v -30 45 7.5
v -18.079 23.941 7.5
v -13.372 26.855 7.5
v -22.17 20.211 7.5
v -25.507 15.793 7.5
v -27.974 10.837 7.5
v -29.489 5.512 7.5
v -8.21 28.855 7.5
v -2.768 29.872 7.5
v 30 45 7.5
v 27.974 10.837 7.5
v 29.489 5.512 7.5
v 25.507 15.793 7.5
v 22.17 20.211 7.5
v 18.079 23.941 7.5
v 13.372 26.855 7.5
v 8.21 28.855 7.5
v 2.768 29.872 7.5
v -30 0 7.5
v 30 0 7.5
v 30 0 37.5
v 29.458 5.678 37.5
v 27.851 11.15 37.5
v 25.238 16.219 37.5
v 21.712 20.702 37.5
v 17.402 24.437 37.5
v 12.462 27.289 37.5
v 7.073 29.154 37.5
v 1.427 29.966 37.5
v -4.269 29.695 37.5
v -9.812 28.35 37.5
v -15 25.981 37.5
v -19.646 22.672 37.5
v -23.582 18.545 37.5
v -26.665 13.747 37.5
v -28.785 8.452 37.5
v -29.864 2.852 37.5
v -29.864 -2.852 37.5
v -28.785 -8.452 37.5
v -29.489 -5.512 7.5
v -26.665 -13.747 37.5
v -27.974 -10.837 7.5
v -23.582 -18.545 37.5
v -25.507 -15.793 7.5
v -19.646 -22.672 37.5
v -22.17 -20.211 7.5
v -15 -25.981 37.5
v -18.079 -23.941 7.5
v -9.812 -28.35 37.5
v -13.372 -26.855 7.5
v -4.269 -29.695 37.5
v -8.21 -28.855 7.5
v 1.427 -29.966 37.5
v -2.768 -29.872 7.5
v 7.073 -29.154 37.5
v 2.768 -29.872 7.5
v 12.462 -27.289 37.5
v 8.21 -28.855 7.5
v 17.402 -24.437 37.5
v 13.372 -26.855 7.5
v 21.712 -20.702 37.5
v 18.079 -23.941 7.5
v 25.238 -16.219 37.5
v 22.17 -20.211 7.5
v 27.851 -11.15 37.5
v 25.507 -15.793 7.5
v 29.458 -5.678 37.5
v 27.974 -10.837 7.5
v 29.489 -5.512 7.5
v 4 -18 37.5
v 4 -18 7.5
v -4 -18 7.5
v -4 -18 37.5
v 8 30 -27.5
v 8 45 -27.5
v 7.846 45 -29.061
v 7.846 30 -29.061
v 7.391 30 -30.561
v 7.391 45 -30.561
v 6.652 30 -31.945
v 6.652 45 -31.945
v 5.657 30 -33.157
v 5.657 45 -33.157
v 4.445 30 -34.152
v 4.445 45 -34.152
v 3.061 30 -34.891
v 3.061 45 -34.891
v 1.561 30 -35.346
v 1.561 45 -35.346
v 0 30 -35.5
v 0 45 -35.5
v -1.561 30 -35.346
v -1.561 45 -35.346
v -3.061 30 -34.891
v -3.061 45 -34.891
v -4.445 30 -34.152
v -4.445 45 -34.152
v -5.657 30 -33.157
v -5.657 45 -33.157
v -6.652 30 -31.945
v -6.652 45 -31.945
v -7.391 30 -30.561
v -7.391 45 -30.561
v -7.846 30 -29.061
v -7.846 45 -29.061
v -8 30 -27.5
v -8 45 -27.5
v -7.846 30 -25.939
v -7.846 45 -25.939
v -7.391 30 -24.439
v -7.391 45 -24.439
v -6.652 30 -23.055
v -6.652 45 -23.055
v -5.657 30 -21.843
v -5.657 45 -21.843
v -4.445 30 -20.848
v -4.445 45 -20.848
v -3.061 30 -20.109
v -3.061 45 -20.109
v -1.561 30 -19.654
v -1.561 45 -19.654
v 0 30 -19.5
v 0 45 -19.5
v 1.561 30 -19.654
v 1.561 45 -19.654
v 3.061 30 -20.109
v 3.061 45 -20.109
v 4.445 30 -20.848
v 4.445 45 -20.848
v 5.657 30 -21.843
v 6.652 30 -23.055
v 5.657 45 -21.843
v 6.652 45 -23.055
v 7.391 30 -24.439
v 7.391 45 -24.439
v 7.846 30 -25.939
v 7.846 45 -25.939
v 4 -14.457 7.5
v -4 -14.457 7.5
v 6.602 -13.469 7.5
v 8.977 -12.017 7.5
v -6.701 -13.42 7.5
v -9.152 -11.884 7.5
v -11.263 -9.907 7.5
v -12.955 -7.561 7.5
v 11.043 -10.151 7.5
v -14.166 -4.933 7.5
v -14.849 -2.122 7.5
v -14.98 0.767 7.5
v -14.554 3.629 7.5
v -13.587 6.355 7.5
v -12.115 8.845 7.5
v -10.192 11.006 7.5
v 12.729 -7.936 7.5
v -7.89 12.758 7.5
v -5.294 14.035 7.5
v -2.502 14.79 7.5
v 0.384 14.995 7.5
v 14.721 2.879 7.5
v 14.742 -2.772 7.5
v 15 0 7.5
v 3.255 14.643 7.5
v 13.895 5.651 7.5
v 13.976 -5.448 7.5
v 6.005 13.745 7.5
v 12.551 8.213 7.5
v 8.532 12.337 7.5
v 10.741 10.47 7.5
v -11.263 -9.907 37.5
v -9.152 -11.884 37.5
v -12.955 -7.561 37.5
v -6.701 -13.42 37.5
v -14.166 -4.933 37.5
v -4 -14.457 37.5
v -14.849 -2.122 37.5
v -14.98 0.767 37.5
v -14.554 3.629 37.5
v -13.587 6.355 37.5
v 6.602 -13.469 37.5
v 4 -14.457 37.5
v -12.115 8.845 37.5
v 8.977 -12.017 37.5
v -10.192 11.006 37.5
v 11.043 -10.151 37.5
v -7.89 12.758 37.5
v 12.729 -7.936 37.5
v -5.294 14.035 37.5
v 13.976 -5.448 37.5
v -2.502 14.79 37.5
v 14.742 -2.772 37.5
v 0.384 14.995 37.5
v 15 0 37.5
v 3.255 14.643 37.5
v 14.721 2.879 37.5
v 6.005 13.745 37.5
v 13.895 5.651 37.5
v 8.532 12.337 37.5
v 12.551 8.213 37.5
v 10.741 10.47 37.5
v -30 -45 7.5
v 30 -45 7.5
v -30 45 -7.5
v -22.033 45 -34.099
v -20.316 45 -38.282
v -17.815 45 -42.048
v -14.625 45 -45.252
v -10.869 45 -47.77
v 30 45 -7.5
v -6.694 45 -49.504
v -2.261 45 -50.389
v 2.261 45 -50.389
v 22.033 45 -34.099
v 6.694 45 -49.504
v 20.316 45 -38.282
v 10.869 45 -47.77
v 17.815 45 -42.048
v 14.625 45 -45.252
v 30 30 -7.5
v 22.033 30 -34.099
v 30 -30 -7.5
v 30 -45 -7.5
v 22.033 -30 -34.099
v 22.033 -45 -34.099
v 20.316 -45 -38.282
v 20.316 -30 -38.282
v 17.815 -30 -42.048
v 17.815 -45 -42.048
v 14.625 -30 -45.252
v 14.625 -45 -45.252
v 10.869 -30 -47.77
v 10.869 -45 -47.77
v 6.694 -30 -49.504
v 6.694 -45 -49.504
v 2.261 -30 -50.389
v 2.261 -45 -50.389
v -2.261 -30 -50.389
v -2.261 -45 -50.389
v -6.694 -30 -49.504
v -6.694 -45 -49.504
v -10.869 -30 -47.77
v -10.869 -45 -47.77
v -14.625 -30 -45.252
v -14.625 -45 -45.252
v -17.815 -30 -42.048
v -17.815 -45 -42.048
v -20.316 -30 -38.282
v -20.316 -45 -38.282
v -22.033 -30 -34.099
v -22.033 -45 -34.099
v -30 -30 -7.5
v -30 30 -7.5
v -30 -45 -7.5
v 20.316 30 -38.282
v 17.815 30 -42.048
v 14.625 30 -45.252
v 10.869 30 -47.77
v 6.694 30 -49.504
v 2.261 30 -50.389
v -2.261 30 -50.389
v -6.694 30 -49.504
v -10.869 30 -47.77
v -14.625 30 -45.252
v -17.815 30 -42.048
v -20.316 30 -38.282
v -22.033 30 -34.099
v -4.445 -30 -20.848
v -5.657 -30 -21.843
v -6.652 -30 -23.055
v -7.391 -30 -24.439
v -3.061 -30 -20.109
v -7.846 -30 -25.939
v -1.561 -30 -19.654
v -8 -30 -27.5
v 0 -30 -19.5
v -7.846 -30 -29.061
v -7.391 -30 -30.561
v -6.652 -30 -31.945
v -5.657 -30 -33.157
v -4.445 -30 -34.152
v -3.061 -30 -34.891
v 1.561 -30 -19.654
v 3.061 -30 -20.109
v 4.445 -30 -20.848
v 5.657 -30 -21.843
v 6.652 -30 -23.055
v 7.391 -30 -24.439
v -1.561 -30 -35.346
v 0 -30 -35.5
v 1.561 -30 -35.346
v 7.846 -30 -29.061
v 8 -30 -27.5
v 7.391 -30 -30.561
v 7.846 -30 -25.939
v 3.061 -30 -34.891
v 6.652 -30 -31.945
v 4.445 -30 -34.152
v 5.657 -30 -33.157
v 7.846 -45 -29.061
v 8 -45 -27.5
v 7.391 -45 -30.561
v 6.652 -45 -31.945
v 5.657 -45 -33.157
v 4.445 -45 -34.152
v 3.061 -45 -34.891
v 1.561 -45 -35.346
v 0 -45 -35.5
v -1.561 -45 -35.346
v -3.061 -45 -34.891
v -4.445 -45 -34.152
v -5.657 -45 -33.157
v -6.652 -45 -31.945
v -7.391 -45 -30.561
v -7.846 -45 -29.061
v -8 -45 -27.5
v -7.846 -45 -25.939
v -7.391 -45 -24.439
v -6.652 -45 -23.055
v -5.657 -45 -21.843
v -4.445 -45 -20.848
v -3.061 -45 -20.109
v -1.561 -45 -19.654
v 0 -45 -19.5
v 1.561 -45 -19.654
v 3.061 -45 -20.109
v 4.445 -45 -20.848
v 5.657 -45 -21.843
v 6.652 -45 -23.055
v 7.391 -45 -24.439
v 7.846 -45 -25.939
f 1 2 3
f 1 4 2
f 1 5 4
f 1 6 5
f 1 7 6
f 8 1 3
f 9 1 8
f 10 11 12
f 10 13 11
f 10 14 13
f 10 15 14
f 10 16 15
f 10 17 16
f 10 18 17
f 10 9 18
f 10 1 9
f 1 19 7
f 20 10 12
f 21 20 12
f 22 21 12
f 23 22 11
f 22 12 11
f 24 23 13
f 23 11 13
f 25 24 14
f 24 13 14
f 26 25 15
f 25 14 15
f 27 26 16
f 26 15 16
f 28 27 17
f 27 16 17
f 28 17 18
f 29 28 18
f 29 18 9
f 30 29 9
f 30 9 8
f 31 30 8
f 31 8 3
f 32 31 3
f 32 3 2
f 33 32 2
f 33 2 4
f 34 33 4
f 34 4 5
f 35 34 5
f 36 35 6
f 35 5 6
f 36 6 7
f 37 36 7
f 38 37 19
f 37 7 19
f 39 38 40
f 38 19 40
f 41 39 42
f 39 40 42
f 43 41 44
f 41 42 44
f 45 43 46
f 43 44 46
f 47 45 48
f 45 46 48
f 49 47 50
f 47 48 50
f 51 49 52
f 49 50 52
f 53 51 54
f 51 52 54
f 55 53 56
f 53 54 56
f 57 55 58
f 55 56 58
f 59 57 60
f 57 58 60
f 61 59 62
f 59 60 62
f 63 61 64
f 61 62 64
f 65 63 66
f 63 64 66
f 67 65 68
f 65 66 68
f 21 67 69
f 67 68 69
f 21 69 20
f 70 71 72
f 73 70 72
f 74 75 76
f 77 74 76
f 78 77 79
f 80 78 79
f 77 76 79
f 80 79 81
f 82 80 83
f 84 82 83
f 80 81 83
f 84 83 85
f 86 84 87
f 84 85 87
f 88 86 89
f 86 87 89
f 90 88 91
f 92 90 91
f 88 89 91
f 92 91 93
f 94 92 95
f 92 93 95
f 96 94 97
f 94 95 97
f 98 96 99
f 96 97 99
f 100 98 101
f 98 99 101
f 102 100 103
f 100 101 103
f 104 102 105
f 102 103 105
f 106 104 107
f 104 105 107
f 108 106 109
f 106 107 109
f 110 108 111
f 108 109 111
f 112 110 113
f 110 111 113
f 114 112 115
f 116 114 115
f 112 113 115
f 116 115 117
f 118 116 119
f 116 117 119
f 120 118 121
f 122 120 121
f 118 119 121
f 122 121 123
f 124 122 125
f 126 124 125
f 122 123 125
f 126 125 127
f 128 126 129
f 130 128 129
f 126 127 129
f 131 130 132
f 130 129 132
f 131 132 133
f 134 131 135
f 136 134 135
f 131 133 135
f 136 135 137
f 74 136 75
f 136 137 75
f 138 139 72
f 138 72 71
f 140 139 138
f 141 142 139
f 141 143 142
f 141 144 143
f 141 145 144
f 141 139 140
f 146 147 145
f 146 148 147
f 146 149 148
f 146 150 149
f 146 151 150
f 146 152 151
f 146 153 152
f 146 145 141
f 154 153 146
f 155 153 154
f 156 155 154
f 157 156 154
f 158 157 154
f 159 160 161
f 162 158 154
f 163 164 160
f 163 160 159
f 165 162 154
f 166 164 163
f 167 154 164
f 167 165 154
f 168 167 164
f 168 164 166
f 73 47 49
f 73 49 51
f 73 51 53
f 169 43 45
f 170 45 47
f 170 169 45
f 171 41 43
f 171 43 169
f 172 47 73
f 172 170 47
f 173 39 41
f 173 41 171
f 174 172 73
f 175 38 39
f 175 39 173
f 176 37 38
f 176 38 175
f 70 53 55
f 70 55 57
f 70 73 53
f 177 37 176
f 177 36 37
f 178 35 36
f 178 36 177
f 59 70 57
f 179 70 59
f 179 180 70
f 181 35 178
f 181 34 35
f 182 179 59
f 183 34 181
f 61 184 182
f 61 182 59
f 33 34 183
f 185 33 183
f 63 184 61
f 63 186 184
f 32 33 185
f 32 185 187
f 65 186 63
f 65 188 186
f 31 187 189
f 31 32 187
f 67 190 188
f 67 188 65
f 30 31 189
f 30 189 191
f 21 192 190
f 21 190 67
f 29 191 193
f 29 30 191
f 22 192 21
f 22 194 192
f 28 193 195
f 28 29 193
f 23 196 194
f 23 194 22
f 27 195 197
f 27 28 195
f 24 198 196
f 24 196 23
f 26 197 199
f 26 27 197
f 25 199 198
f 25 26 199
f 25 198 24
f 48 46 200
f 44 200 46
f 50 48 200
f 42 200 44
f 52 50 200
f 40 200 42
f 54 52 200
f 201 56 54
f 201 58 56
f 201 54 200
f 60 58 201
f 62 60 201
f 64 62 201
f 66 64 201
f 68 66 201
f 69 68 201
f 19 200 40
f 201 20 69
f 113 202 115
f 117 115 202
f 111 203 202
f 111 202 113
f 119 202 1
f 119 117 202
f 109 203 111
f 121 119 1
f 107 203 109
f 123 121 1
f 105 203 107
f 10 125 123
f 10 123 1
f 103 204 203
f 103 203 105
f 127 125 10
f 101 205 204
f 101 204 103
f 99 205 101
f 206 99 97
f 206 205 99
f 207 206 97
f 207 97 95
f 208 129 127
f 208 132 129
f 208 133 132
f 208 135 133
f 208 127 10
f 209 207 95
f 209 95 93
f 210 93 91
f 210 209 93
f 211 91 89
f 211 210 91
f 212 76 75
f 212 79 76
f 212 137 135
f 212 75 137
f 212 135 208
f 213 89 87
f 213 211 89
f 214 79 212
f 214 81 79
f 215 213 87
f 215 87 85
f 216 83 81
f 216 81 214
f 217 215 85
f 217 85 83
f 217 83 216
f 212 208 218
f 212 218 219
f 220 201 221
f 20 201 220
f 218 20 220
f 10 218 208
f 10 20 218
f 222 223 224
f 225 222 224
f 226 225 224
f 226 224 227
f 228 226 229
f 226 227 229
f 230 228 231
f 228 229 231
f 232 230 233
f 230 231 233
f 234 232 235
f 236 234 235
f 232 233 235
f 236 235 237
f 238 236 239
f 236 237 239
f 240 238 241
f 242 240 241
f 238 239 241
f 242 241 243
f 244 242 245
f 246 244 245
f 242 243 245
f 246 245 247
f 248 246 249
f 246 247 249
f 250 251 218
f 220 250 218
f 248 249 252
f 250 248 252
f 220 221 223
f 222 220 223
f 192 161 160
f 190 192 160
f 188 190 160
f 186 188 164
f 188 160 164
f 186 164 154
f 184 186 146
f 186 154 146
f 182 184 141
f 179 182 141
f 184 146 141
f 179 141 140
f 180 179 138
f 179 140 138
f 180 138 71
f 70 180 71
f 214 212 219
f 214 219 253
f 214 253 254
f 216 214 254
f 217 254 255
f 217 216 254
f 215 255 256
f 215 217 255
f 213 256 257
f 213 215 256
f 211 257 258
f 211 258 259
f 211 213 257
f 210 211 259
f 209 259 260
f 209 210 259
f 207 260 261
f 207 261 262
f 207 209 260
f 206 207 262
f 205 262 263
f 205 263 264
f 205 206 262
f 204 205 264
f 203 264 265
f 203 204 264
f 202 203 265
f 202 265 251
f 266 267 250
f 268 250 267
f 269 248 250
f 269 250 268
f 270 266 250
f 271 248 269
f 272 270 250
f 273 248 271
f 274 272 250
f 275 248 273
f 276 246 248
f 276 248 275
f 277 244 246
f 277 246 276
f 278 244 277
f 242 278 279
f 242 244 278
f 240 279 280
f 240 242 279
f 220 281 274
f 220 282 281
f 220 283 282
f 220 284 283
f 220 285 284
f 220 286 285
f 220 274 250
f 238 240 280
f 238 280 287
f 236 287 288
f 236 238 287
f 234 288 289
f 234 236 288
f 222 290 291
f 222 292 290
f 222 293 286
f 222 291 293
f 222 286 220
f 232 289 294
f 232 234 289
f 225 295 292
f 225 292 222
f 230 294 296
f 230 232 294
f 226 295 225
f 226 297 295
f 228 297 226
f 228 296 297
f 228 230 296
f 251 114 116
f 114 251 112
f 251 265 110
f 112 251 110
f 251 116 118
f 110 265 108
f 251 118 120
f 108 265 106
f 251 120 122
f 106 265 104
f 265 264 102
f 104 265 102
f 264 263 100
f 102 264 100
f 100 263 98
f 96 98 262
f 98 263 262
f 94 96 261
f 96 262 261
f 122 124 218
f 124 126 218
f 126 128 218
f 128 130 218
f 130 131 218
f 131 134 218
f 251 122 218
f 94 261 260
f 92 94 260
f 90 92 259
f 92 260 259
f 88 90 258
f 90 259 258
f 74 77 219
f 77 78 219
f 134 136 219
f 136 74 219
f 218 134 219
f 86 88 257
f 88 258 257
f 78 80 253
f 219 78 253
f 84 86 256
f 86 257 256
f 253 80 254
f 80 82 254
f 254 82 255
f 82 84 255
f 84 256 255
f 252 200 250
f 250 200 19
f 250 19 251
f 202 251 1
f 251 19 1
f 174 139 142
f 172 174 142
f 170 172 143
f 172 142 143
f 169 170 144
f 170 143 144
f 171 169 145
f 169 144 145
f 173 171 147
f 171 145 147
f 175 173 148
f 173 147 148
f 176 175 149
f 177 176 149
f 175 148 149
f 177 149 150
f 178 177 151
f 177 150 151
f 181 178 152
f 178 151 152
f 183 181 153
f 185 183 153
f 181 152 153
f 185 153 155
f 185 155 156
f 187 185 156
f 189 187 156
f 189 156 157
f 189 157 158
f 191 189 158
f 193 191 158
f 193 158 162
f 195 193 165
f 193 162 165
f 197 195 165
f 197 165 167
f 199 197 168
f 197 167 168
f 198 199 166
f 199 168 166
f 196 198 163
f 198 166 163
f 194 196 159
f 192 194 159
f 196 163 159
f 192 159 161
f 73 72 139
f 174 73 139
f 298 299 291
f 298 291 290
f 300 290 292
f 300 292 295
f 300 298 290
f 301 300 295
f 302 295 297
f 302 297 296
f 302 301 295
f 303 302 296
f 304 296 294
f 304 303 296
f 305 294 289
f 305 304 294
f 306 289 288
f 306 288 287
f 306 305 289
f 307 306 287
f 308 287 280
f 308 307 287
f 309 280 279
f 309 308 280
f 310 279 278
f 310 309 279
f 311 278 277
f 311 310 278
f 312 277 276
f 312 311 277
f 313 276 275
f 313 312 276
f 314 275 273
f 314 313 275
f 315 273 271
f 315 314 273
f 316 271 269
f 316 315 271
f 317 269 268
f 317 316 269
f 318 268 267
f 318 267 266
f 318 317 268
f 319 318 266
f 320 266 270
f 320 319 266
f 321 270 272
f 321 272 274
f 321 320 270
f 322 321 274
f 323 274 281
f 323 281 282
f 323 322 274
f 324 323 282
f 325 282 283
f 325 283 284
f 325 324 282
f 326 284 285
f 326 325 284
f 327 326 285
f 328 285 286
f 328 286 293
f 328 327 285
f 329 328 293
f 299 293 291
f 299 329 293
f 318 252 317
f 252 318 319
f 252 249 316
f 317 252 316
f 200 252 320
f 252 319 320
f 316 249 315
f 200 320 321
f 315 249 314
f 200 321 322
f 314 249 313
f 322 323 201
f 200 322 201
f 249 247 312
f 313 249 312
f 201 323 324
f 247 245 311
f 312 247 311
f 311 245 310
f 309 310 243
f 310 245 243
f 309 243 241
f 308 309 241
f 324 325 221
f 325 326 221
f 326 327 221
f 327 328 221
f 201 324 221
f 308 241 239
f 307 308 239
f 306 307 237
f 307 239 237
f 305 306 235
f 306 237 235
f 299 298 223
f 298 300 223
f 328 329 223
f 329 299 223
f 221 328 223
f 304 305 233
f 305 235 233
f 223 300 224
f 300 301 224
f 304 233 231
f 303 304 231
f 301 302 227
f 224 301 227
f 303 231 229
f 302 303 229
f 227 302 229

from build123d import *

# Parameters (mm, degrees)
SKETCH1_W           = 60
SKETCH1_H           = 90
BOSS_EXTRUDE1_DEPTH = 7.5
SKETCH2_R           = 30
BOSS_EXTRUDE4_DEPTH = 30
SKETCH3_R           = 8
BOSS_EXTRUDE5_DEPTH = 15


with BuildPart() as part:
    # Sketch1 → Boss-Extrude1 (new body, symmetric)
    with BuildSketch(Plane.XY):
        Rectangle(SKETCH1_W, SKETCH1_H)
    extrude(amount=BOSS_EXTRUDE1_DEPTH, both=True)

    # Sketch2 → Boss-Extrude4 (add)
    with BuildSketch(Plane.XY.offset(7.5)):
        Circle(SKETCH2_R)
        with BuildLine():
            Line((4, -18), (0, -18))
            Line((0, -18), (-4, -18))
            Line((-4, -18), (-4, -15))
            Line((-4, -15), (-4, -14.456832295))
            ThreePointArc((-4, -14.456832295), (-9.082951062, 11.937336386), (15, 0))
            ThreePointArc((15, 0), (11.937336386, -9.082951062), (4, -14.456832295))
            Line((4, -14.456832295), (4, -18))
        make_face(mode=Mode.SUBTRACT)
    extrude(amount=BOSS_EXTRUDE4_DEPTH)

    # Sketch3 → Boss-Extrude5 (add)
    with BuildSketch(Plane(origin=(0, 45, 0), x_dir=(1, 0, 0), z_dir=(0, 1, 0))):
        with BuildLine():
            Line((-22.03289839, 34.099347585), (-30, 7.5))
            Line((-30, 7.5), (-11.357816691, 7.5))
            ThreePointArc((-11.357816691, 7.5), (-21.345170095, 18.933570545), (-22.03289839, 34.099347585))
        make_face()
        with BuildLine():
            Line((30, 7.5), (22.03289839, 34.099347585))
            ThreePointArc((22.03289839, 34.099347585), (22.756940293, 30.834916568), (23, 27.5))
            ThreePointArc((23, 27.5), (19.877497125, 15.929126738), (11.357816692, 7.5))
            Line((11.357816692, 7.5), (30, 7.5))
        make_face()
        with BuildLine():
            ThreePointArc((22.03289839, 34.099347585), (0, 50.5), (-22.03289839, 34.099347585))
            ThreePointArc((-22.03289839, 34.099347585), (-21.345170095, 18.933570545), (-11.357816691, 7.5))
            Line((-11.357816691, 7.5), (11.357816692, 7.5))
            ThreePointArc((11.357816692, 7.5), (19.877497125, 15.929126738), (23, 27.5))
            ThreePointArc((23, 27.5), (22.756940293, 30.834916568), (22.03289839, 34.099347585))
        make_face()
        with Locations((0, 27.5)):
            Circle(SKETCH3_R, mode=Mode.SUBTRACT)
    boss_extrude5 = extrude(amount=-BOSS_EXTRUDE5_DEPTH)

    # Mirror1: Boss-Extrude5 across plane
    add(boss_extrude5.mirror(Plane.ZX))


solid = part.part
